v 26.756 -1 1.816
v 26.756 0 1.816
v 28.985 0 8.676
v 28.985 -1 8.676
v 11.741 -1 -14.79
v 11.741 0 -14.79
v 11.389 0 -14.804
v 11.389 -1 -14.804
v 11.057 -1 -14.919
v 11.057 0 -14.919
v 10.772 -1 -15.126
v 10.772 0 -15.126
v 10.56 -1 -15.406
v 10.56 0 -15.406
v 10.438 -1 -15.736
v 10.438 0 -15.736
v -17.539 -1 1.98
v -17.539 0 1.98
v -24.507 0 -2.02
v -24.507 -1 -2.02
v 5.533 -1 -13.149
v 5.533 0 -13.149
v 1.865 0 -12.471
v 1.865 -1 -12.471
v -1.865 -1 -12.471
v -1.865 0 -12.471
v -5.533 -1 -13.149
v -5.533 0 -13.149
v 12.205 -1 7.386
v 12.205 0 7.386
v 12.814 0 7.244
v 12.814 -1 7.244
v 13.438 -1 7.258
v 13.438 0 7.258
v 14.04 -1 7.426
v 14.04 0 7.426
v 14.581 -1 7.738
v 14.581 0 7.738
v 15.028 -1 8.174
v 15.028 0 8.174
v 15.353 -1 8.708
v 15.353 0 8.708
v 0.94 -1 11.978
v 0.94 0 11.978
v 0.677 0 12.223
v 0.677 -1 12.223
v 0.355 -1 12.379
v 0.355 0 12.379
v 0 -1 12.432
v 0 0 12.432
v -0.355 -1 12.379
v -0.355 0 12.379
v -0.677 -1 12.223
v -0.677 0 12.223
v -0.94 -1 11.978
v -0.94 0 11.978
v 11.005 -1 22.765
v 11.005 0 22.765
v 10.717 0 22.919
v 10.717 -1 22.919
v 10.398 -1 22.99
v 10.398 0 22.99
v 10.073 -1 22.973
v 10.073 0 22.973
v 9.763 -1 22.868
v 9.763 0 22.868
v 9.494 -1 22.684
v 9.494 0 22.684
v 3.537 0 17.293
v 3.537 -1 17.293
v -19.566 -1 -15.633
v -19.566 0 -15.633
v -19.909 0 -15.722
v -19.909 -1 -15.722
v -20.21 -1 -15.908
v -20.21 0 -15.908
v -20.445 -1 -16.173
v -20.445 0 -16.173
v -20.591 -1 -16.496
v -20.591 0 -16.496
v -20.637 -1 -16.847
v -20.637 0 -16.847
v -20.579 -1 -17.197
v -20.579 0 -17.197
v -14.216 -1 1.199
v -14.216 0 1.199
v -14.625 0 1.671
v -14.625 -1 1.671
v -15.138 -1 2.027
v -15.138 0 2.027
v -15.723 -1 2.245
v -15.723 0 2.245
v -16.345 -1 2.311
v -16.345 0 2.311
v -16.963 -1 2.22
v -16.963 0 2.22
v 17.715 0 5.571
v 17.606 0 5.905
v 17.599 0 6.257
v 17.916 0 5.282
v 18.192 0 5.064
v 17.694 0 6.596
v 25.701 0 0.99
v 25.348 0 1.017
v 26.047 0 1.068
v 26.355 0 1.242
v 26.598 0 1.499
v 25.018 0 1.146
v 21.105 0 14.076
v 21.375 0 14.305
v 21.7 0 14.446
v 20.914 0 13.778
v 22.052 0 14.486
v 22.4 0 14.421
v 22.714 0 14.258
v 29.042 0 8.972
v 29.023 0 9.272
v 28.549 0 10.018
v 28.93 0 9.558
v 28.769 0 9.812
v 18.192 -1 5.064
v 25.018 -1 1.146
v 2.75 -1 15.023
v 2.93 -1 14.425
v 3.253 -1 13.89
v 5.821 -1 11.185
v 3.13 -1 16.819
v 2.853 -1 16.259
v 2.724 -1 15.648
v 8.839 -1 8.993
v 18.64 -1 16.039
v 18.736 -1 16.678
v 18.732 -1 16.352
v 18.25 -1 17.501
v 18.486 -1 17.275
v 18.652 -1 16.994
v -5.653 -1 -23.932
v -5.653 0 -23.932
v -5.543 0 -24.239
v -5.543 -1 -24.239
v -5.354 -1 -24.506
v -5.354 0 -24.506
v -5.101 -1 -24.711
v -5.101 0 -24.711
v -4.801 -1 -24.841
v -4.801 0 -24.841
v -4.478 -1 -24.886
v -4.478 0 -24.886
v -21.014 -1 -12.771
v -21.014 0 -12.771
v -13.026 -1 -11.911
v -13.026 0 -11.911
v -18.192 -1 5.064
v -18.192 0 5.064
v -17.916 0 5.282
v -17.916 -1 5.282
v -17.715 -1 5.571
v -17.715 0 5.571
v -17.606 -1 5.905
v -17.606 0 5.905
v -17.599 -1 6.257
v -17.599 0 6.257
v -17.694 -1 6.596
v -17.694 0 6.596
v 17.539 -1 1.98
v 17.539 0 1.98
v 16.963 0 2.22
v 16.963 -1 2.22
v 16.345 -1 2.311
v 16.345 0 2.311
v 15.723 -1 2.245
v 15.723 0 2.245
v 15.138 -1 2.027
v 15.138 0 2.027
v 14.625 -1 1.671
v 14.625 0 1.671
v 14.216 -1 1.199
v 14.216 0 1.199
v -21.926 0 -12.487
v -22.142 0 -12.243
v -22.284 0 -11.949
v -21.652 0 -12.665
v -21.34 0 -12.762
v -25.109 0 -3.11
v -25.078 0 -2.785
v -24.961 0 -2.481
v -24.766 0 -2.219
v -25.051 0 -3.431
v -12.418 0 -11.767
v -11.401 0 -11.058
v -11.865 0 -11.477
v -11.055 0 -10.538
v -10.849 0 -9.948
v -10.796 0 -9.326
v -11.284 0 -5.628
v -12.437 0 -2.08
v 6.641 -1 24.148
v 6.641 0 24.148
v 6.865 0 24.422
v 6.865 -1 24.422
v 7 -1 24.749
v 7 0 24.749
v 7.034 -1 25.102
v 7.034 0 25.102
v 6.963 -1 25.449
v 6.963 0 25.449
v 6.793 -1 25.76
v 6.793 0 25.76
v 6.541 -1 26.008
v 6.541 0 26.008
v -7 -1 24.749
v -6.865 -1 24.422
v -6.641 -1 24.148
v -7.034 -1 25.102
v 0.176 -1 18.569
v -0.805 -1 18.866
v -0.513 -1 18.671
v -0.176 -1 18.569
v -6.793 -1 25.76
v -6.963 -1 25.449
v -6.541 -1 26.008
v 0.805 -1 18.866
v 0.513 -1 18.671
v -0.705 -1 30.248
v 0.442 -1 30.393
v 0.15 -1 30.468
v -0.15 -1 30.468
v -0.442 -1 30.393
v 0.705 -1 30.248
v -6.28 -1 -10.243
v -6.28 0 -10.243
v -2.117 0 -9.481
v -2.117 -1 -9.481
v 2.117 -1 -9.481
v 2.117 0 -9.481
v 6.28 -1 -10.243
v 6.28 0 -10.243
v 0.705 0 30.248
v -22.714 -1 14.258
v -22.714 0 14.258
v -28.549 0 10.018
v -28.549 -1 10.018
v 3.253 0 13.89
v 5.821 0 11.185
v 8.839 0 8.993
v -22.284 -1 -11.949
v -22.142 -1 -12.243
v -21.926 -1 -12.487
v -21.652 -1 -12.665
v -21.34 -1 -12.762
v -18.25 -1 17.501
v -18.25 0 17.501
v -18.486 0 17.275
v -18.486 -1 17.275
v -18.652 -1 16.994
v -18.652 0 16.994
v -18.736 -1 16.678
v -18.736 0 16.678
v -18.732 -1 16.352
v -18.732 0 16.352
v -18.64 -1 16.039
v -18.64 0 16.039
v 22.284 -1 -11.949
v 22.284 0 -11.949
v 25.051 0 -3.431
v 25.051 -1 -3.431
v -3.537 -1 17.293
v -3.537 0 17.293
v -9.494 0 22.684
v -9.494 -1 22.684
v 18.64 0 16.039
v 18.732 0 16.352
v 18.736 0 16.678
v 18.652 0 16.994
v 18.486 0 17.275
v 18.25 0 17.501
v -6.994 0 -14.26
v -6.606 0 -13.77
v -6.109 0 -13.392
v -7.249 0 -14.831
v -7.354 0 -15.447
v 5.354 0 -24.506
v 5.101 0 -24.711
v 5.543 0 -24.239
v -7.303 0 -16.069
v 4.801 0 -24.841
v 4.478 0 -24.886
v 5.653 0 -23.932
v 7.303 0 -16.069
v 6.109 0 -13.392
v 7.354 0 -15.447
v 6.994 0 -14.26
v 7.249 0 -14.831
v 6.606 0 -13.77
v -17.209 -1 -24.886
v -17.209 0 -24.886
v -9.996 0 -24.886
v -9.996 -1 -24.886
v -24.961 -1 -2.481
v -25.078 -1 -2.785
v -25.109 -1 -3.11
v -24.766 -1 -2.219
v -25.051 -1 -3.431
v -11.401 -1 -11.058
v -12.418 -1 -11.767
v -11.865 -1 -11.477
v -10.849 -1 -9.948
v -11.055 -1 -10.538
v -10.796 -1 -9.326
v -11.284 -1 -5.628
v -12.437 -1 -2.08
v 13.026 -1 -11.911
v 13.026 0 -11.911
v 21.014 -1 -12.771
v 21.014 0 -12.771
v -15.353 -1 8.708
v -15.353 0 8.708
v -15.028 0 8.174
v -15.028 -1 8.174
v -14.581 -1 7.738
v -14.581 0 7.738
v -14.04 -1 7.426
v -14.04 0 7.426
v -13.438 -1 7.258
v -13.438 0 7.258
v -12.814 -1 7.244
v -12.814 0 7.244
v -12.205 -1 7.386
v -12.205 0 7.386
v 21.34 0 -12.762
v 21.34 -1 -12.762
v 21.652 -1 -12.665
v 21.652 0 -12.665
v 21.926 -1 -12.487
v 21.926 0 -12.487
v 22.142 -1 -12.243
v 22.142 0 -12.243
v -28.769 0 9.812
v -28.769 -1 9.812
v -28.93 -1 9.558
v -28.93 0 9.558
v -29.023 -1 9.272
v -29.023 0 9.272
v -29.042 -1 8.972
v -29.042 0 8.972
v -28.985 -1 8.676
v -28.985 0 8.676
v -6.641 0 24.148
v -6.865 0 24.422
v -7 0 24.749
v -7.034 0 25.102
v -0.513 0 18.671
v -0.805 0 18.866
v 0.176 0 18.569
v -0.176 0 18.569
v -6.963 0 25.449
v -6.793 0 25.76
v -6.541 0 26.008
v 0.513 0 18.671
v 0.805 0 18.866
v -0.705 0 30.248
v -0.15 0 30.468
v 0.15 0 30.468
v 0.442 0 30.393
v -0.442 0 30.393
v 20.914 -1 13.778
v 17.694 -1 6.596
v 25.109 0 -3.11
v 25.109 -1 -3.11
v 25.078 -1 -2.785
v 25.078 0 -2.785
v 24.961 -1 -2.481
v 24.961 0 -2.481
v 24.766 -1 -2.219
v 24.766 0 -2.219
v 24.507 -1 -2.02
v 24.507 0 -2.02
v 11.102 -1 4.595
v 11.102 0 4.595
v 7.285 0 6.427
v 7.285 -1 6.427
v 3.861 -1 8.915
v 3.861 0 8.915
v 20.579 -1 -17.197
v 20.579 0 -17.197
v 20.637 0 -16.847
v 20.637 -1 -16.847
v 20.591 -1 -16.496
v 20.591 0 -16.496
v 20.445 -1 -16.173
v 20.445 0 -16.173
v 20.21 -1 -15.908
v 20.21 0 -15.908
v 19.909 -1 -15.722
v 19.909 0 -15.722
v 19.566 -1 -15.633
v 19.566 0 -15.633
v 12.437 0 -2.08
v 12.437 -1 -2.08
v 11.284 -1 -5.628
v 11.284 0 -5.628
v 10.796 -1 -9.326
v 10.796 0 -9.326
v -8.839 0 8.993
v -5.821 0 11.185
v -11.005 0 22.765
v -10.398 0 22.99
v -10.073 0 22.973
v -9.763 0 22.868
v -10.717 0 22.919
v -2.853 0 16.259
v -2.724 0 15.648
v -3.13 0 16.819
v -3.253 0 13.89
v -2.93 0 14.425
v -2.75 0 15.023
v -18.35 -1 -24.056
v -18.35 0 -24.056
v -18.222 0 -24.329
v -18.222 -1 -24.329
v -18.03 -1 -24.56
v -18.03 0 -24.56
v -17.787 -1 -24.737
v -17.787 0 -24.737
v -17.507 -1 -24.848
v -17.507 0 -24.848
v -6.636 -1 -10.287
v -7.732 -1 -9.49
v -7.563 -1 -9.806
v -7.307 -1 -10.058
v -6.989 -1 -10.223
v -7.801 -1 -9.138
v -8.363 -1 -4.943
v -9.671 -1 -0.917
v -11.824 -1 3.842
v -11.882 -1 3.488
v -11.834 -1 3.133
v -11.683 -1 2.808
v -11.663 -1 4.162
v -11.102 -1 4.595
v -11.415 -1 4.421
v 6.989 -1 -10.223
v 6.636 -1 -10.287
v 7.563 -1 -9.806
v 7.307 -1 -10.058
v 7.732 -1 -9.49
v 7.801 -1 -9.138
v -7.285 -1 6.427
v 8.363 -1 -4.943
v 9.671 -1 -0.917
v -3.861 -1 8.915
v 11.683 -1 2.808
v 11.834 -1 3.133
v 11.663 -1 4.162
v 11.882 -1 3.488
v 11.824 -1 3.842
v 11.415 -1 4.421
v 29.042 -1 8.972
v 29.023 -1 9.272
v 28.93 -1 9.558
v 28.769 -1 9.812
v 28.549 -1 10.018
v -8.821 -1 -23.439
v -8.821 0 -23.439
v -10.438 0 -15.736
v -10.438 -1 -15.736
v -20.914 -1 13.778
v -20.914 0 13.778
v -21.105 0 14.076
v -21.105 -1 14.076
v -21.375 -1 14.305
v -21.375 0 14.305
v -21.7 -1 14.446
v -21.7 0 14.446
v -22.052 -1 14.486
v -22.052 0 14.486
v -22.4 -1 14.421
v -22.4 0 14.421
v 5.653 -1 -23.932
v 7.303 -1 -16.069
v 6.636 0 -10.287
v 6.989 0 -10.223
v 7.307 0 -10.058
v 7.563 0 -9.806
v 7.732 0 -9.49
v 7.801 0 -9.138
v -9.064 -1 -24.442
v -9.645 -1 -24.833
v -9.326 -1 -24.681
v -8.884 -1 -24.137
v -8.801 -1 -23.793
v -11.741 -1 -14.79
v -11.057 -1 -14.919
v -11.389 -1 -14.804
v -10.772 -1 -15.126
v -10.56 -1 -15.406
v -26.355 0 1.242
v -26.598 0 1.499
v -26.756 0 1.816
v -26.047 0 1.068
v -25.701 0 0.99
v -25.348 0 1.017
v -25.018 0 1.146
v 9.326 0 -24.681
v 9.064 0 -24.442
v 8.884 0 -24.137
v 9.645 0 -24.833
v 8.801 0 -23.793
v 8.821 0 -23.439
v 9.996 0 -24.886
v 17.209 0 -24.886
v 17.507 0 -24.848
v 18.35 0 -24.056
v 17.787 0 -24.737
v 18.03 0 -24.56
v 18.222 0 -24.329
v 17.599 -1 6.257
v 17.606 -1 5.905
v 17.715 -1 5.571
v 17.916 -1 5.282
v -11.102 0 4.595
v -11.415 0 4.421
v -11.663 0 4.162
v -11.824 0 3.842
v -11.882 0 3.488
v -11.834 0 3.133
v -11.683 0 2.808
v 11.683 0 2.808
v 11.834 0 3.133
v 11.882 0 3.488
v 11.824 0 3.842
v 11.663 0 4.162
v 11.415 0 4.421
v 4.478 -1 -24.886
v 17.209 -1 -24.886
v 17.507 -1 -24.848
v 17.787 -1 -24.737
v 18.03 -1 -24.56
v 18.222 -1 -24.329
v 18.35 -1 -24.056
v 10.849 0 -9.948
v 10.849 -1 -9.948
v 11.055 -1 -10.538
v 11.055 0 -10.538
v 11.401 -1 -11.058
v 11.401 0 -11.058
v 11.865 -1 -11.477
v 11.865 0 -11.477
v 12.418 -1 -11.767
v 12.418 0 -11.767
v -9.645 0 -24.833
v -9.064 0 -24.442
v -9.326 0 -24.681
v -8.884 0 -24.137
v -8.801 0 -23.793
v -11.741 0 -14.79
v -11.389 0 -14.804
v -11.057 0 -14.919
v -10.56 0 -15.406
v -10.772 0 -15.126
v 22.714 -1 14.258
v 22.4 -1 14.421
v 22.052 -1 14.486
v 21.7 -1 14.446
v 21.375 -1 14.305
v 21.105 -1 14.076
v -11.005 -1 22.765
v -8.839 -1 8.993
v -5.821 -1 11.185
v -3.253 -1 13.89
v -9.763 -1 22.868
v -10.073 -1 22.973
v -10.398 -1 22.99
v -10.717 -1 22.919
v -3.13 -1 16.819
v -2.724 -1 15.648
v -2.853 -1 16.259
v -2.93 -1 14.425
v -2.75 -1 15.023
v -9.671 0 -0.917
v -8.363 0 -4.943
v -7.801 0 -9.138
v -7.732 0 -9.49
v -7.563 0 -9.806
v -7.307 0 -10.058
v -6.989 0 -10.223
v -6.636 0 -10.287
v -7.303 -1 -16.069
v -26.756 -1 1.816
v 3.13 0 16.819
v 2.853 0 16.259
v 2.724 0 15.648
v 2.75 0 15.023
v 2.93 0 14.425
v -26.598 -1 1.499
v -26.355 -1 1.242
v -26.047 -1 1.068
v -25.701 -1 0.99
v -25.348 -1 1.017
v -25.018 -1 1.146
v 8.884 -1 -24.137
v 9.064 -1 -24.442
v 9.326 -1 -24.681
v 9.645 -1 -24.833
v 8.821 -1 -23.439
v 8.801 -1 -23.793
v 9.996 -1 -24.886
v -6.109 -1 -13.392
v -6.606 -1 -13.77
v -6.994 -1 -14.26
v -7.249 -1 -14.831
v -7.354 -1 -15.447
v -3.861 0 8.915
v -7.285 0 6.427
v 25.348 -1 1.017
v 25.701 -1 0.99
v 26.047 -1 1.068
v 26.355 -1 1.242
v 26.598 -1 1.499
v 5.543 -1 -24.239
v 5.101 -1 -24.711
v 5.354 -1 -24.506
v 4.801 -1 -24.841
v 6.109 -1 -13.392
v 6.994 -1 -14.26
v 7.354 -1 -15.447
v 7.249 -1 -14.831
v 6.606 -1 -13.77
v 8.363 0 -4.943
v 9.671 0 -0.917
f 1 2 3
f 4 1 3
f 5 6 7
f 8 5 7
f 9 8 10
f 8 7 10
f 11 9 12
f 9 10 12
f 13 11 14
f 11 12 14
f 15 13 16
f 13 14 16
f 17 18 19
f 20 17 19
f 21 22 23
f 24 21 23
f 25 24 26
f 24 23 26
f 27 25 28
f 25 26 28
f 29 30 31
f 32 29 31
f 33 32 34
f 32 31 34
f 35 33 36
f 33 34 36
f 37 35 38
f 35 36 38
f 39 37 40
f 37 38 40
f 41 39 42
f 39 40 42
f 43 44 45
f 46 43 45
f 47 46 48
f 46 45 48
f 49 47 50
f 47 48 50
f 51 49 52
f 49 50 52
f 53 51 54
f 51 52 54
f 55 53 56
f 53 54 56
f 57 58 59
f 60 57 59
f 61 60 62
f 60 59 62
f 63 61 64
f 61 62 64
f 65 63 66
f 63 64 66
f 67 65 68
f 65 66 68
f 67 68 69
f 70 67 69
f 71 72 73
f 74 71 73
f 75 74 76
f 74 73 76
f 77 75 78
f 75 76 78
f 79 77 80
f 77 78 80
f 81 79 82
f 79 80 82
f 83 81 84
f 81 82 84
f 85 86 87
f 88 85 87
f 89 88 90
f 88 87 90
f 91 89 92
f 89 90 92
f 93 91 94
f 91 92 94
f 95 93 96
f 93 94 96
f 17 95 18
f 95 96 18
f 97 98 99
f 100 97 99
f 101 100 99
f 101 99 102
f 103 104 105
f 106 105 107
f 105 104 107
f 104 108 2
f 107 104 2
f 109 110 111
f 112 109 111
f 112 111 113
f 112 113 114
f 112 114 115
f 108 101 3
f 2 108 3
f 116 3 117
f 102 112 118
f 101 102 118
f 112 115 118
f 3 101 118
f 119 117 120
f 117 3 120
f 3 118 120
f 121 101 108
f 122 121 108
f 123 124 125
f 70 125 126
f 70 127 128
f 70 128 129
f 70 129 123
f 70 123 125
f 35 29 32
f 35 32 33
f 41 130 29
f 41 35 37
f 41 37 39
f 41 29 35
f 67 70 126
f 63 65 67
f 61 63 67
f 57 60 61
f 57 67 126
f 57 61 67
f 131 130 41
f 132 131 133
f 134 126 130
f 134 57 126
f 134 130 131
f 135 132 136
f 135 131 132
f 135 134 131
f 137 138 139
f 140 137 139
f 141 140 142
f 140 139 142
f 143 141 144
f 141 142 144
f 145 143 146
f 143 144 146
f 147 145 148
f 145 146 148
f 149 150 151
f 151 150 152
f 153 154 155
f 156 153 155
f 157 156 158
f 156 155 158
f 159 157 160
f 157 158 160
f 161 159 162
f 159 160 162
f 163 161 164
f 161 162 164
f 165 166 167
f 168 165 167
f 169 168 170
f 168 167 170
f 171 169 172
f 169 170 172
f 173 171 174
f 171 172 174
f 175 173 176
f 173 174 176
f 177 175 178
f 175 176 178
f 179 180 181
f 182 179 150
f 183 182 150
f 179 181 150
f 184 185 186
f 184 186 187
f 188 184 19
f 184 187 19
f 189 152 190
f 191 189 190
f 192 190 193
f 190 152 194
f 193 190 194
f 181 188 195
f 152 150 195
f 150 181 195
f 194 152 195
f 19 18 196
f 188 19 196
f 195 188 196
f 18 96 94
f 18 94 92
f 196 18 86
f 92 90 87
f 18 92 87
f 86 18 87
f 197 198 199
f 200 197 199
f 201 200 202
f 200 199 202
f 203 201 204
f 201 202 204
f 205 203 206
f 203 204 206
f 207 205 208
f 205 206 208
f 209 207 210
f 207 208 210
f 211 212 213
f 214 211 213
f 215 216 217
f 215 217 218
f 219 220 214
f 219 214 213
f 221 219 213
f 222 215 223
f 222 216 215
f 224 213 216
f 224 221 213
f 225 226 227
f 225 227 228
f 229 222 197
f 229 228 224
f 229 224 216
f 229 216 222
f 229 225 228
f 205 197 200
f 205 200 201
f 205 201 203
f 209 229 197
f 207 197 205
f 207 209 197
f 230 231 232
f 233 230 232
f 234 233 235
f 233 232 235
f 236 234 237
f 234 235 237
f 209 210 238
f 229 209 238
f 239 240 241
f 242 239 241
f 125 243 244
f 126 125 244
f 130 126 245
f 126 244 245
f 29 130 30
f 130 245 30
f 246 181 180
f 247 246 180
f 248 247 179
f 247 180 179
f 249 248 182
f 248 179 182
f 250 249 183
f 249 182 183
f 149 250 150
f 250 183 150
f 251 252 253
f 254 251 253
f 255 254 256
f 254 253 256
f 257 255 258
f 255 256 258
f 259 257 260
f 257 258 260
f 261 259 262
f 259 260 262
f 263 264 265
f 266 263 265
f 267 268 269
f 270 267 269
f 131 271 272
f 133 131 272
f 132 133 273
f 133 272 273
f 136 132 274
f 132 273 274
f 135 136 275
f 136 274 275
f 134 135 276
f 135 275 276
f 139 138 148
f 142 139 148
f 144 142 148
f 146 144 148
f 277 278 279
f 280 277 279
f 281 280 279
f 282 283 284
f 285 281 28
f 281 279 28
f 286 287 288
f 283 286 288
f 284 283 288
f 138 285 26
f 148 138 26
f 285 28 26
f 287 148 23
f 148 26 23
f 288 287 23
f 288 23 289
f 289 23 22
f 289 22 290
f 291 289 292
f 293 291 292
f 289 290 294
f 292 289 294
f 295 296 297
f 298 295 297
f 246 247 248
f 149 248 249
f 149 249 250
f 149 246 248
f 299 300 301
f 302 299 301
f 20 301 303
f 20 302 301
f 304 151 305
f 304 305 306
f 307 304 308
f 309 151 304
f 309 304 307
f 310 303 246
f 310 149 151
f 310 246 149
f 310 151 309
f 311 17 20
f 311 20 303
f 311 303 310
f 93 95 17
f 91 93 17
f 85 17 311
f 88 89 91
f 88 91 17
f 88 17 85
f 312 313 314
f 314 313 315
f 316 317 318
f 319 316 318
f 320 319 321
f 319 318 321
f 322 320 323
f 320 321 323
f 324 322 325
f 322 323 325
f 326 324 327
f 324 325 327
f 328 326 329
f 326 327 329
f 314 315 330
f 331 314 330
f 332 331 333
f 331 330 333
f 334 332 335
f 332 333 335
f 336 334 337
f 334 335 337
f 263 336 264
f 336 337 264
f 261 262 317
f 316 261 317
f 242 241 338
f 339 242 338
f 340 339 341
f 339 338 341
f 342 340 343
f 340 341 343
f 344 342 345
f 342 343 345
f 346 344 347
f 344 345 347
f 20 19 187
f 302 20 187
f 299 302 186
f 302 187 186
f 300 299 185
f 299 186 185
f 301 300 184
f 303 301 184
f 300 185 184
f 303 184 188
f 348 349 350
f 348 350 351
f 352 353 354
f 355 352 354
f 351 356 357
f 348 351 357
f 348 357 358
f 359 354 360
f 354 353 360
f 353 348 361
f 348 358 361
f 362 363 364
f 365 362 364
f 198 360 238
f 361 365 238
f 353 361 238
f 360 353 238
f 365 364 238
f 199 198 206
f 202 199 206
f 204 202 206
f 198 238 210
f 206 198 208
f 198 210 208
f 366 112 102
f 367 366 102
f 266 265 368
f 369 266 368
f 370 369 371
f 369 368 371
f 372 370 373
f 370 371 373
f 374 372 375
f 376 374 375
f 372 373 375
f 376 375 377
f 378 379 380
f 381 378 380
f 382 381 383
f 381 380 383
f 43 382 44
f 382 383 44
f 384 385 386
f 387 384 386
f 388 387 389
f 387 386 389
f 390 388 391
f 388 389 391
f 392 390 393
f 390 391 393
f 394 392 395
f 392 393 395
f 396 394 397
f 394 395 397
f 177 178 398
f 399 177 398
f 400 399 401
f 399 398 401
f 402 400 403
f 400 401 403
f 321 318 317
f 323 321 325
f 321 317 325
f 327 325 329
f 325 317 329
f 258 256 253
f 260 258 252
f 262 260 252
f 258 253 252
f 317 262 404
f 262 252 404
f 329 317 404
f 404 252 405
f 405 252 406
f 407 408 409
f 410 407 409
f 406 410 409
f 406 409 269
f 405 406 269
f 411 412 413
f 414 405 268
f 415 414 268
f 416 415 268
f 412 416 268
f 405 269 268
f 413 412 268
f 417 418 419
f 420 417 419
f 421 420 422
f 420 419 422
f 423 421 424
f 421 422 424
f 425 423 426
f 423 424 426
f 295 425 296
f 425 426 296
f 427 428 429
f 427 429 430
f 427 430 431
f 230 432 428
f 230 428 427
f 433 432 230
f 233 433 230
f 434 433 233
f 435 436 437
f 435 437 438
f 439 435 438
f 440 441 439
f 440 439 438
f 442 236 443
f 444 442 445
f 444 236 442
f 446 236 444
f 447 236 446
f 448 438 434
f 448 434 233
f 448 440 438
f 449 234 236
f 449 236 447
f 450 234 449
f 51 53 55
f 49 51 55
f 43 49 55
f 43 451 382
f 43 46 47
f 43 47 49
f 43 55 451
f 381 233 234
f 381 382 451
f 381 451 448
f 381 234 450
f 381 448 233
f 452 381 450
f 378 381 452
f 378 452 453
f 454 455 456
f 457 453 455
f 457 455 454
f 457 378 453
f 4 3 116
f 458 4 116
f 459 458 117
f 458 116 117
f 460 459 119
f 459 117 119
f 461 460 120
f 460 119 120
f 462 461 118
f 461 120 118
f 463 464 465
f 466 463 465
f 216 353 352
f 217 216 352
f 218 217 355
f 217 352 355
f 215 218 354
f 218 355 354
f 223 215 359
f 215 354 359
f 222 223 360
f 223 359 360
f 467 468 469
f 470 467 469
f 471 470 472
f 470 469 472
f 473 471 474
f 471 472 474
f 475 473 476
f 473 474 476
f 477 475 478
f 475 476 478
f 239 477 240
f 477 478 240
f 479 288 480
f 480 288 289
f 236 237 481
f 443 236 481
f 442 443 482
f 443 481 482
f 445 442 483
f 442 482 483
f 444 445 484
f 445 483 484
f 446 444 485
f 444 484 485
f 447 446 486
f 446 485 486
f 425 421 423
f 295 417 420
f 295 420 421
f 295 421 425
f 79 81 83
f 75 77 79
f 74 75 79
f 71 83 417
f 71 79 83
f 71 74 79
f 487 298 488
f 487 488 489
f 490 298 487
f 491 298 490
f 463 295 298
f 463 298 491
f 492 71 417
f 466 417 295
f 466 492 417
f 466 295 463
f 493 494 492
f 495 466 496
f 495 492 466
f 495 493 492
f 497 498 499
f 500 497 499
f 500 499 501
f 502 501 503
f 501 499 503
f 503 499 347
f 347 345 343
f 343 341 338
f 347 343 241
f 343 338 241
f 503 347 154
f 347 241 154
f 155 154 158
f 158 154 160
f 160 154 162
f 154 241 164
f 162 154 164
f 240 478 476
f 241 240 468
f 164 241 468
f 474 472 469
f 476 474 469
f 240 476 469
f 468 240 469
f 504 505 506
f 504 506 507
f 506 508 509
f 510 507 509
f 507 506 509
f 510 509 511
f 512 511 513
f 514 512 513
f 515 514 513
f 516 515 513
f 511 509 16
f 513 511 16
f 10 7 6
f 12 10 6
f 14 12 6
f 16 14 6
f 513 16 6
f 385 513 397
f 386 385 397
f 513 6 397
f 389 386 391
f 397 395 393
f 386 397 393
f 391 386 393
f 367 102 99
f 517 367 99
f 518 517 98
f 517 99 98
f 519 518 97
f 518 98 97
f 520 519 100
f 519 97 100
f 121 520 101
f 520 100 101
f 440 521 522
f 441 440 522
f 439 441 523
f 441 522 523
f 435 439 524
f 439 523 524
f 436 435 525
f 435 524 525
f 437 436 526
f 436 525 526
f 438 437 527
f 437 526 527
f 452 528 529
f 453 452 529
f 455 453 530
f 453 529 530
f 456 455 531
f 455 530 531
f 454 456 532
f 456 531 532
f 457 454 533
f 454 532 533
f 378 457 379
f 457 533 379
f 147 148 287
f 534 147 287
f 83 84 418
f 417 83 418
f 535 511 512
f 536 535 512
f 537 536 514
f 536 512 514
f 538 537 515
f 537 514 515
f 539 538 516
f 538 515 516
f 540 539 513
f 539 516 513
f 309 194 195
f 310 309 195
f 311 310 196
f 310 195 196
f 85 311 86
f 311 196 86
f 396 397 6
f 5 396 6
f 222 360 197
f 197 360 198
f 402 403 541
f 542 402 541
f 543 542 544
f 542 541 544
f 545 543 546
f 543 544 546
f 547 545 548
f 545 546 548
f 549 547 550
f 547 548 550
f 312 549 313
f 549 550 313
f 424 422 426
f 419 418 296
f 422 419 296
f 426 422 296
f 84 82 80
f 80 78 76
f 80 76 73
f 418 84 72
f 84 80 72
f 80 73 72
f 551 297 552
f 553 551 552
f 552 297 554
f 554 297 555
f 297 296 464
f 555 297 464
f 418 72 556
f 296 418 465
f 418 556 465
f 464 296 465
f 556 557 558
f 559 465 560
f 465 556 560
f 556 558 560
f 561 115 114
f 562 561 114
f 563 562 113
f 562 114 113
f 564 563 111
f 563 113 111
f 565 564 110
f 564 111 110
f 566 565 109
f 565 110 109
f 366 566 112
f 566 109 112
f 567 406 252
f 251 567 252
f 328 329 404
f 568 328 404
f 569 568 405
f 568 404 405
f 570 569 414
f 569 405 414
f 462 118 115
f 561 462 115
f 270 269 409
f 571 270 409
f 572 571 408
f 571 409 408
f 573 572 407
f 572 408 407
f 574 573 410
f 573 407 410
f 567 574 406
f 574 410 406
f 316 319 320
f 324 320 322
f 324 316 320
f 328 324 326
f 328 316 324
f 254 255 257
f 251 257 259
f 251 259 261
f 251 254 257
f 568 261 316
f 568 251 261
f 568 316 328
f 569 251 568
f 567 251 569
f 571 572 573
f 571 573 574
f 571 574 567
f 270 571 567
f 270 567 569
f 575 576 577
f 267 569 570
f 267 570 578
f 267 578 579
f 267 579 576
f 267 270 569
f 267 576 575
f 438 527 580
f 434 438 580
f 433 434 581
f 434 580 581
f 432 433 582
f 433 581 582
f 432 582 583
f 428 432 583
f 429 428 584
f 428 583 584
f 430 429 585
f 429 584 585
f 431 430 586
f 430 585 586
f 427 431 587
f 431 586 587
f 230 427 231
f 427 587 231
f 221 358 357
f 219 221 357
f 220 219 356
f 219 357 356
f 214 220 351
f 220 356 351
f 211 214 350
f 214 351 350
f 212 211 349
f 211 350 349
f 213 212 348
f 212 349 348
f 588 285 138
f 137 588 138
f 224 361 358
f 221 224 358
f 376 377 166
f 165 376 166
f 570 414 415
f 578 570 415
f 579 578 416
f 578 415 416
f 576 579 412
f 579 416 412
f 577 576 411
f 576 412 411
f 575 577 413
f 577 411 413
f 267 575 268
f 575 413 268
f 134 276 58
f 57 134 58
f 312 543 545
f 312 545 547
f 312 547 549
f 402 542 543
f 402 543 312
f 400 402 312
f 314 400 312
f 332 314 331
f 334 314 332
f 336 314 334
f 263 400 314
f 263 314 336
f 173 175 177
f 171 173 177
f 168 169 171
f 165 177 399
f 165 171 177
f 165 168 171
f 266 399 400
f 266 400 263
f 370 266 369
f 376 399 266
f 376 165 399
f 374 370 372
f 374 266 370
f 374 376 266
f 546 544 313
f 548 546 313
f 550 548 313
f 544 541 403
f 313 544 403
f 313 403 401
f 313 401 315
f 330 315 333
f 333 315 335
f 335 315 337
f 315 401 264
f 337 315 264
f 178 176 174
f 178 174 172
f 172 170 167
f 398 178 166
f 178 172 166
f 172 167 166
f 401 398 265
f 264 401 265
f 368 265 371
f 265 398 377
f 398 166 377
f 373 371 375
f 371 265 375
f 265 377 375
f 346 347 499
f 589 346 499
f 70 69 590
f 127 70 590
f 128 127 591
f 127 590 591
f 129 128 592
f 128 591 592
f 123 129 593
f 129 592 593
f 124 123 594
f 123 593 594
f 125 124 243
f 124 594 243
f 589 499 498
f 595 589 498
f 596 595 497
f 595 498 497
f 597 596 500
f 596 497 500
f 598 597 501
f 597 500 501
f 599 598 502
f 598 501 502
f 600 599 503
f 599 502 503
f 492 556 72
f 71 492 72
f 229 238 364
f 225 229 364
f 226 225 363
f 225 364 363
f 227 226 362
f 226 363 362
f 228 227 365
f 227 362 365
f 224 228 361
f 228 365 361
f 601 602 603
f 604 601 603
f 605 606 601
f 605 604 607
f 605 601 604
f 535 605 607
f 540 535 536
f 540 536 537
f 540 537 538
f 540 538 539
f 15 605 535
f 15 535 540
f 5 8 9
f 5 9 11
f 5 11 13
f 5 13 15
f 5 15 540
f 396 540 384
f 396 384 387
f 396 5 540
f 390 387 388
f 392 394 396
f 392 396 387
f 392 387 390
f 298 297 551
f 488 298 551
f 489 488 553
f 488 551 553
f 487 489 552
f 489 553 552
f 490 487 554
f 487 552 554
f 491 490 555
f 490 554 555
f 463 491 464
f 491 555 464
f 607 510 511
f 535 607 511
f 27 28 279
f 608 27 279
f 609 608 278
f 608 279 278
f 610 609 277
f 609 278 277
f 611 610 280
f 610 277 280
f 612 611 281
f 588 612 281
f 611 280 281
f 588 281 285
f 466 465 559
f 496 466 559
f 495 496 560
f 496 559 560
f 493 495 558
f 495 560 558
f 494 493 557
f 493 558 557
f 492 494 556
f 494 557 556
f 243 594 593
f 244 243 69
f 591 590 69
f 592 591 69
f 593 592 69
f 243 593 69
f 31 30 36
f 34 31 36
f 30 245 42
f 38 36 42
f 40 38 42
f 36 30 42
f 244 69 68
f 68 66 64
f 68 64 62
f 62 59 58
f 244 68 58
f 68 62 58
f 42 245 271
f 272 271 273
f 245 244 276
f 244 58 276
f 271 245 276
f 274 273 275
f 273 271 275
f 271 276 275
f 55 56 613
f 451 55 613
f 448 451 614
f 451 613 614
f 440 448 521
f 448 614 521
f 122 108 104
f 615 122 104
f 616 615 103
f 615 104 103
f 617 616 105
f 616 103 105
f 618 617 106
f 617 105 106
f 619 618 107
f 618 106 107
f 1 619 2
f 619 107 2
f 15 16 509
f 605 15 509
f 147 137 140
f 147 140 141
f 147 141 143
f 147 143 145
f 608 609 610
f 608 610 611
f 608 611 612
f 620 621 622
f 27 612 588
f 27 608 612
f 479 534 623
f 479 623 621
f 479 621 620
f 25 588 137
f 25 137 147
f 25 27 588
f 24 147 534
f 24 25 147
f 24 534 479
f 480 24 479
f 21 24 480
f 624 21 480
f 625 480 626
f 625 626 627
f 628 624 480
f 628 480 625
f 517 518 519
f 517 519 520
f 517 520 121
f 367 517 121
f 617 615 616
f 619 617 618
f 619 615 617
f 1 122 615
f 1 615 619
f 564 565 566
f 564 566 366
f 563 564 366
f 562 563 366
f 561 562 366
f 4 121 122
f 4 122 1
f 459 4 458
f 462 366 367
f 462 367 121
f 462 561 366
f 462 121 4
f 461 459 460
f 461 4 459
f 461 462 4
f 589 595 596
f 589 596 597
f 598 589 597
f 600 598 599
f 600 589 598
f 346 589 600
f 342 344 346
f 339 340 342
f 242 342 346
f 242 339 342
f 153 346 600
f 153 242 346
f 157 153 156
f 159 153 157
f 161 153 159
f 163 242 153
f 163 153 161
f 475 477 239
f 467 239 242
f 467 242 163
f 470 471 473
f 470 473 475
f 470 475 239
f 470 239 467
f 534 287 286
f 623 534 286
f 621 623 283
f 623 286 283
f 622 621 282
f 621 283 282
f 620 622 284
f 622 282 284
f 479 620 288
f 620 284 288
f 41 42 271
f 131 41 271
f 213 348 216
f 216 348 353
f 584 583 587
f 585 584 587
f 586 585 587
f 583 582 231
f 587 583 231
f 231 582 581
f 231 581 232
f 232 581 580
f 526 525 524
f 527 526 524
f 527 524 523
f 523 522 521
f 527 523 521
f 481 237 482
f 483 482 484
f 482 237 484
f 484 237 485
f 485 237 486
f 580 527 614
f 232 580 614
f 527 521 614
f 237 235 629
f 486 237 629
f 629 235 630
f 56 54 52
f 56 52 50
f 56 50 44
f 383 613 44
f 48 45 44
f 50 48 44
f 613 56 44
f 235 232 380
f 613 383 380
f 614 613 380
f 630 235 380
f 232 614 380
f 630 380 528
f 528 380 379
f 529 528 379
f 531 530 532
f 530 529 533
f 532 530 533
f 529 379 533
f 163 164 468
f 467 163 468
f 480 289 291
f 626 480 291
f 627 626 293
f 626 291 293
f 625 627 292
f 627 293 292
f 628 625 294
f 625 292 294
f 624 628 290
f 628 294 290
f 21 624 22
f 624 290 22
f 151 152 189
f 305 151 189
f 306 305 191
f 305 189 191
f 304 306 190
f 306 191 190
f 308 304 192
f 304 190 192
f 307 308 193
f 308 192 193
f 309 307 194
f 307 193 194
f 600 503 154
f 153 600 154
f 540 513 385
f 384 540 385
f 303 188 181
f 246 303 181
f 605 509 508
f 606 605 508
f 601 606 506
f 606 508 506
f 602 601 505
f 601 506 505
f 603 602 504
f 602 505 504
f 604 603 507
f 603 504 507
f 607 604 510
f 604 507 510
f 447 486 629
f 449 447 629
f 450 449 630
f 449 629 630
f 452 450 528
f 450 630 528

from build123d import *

# Parameters (mm, degrees)
F1_DEPTH = 1


# Not quite as in the source:
# - a feature names something its author has since deleted; it is built from what else it names


with BuildPart() as f1:
    # F0 (on Front) → F1 (new body)
    with BuildSketch(Plane.XZ):
        with BuildLine():
            Line((-17.694116513, 6.5958520163), (-20.9137744033, 13.7776049975))
            ThreePointArc((-20.9137744033, 13.7776049975), (-21.6996777578, 14.4462150283), (-22.7141135884, 14.2575263913))
            Line((-22.7141135884, 14.2575263913), (-28.5494375554, 10.0179153646))
            ThreePointArc((-28.5494375554, 10.0179153646), (-28.9853630722, 9.4179153646), (-28.9853630722, 8.6762745781))
            Line((-28.9853630722, 8.6762745781), (-26.7564676522, 1.8164398378))
            ThreePointArc((-26.7564676522, 1.8164398378), (-26.0466802236, 1.0675171033), (-25.0178719382, 1.1464915793))
            Line((-25.0178719382, 1.1464915793), (-18.191785501, 5.0641843652))
            ThreePointArc((-18.191785501, 5.0641843652), (-17.6478455759, 5.7341326237), (-17.694116513, 6.5958520163))
        make_face()
    extrude(amount=F1_DEPTH)


with BuildPart() as f1b:
    # F0 (on Front) → F1, piece 2 (new body)
    with BuildSketch(Plane.XZ):
        with BuildLine():
            ThreePointArc((-12.2053541777, 7.3856519674), (-7.2800742754, 10.0201626124), (-3.2525105674, 13.8902735969))
            ThreePointArc((-3.2525105674, 13.8902735969), (-2.7235874919, 15.6476925752), (-3.5372825515, 17.2927401232))
            Line((-3.5372825515, 17.2927401232), (-9.4939464638, 22.6839212654))
            ThreePointArc((-9.4939464638, 22.6839212654), (-10.2348492198, 22.9924872502), (-11.0045341042, 22.7650338717))
            Line((-11.0045341042, 22.7650338717), (-18.2502457539, 17.5007162125))
            ThreePointArc((-18.2502457539, 17.5007162125), (-18.7044124814, 16.838989347), (-18.6399003336, 16.0389968198))
            Line((-18.6399003336, 16.0389968198), (-15.3532927565, 8.7079061979))
            ThreePointArc((-15.3532927565, 8.7079061979), (-14.040205168, 7.4256885604), (-12.2053541777, 7.3856519674))
        make_face()
    extrude(amount=F1_DEPTH)


with BuildPart() as f1c:
    # F0 (on Front) → F1, piece 3 (new body)
    with BuildSketch(Plane.XZ):
        with BuildLine():
            Line((0.8052453376, 18.8663351752), (6.6405693046, 24.1476955125))
            ThreePointArc((6.6405693046, 24.1476955125), (7.0335977388, 25.1017458812), (6.5406662698, 26.0082236928))
            Line((6.5406662698, 26.0082236928), (0.7053423028, 30.2478347195))
            ThreePointArc((0.7053423028, 30.2478347195), (0, 30.4770143263), (-0.7053423028, 30.2478347195))
            Line((-0.7053423028, 30.2478347195), (-6.5406662698, 26.0082236928))
            ThreePointArc((-6.5406662698, 26.0082236928), (-7.0335977388, 25.1017458812), (-6.6405693046, 24.1476955125))
            Line((-6.6405693046, 24.1476955125), (-0.8052453376, 18.8663351752))
            ThreePointArc((-0.8052453376, 18.8663351752), (0, 18.5560429622), (0.8052453376, 18.8663351752))
        make_face()
    extrude(amount=F1_DEPTH)


with BuildPart() as f1d:
    # F0 (on Front) → F1, piece 4 (new body)
    with BuildSketch(Plane.XZ):
        with BuildLine():
            ThreePointArc((3.2525105674, 13.8902735969), (7.2800742754, 10.0201626124), (12.2053541777, 7.3856519674))
            ThreePointArc((12.2053541777, 7.3856519674), (14.040205168, 7.4256885604), (15.3532927565, 8.7079061979))
            Line((15.3532927565, 8.7079061979), (18.6399003336, 16.0389968198))
            ThreePointArc((18.6399003336, 16.0389968198), (18.7044124814, 16.838989347), (18.2502457539, 17.5007162125))
            Line((18.2502457539, 17.5007162125), (11.0045341042, 22.7650338717))
            ThreePointArc((11.0045341042, 22.7650338717), (10.2348492198, 22.9924872502), (9.4939464638, 22.6839212654))
            Line((9.4939464638, 22.6839212654), (3.5372825515, 17.2927401232))
            ThreePointArc((3.5372825515, 17.2927401232), (2.7235874919, 15.6476925752), (3.2525105674, 13.8902735969))
        make_face()
    extrude(amount=F1_DEPTH)


with BuildPart() as f1e:
    # F0 (on Front) → F1, piece 5 (new body)
    with BuildSketch(Plane.XZ):
        with BuildLine():
            ThreePointArc((-10.795834294, -9.3256896519), (-11.7794076183, -3.8273615451), (-14.2155162571, 1.1990092285))
            ThreePointArc((-14.2155162571, 1.1990092285), (-15.7234748093, 2.2451172966), (-17.5394536011, 1.9795949568))
            Line((-17.5394536011, 1.9795949568), (-24.5074819356, -2.0195624797))
            ThreePointArc((-24.5074819356, -2.0195624797), (-25.0298971689, -2.6288507405), (-25.0514218607, -3.4311515247))
            Line((-25.0514218607, -3.4311515247), (-22.2838062832, -11.9489964249))
            ThreePointArc((-22.2838062832, -11.9489964249), (-21.7948118729, -12.5854194976), (-21.0140384169, -12.7712760853))
            Line((-21.0140384169, -12.7712760853), (-13.0261393142, -11.9109581221))
            ThreePointArc((-13.0261393142, -11.9109581221), (-11.4009114947, -11.058364655), (-10.795834294, -9.3256896519))
        make_face()
    extrude(amount=F1_DEPTH)


with BuildPart() as f1f:
    # F0 (on Front) → F1, piece 6 (new body)
    with BuildSketch(Plane.XZ):
        with BuildLine():
            Line((-11.7408107436, -14.7898744444), (-19.5659927189, -15.6326673405))
            ThreePointArc((-19.5659927189, -15.6326673405), (-20.4447361381, -16.173493985), (-20.5787604917, -17.1965877874))
            Line((-20.5787604917, -17.1965877874), (-18.3498650717, -24.0564225277))
            ThreePointArc((-18.3498650717, -24.0564225277), (-17.9139395549, -24.6564225277), (-17.2085972521, -24.8856021345))
            Line((-17.2085972521, -24.8856021345), (-9.9957401582, -24.8856021345))
            ThreePointArc((-9.9957401582, -24.8856021345), (-9.0641359335, -24.4419840278), (-8.8213258793, -23.4391247487))
            Line((-8.8213258793, -23.4391247487), (-10.437896418, -15.7364971123))
            ThreePointArc((-10.437896418, -15.7364971123), (-10.9069683941, -15.0121541048), (-11.7408107436, -14.7898744444))
        make_face()
    extrude(amount=F1_DEPTH)


with BuildPart() as f1g:
    # F0 (on Front) → F1, piece 7 (new body)
    with BuildSketch(Plane.XZ):
        with BuildLine():
            ThreePointArc((-5.5331616471, -13.1492451408), (-6.9940543615, -14.2601337772), (-7.3026959181, -16.069283156))
            Line((-7.3026959181, -16.069283156), (-5.652510351, -23.9320795203))
            ThreePointArc((-5.652510351, -23.9320795203), (-5.2344779655, -24.6172063592), (-4.4780960722, -24.8856021345))
            Line((-4.4780960722, -24.8856021345), (4.4780960722, -24.8856021345))
            ThreePointArc((4.4780960722, -24.8856021345), (5.2344779655, -24.6172063592), (5.652510351, -23.9320795203))
            Line((5.652510351, -23.9320795203), (7.3026959181, -16.069283156))
            ThreePointArc((7.3026959181, -16.069283156), (6.9940543615, -14.2601337772), (5.5331616471, -13.1492451408))
            ThreePointArc((5.5331616471, -13.1492451408), (0, -12.3856021345), (-5.5331616471, -13.1492451408))
        make_face()
    extrude(amount=F1_DEPTH)


with BuildPart() as f1h:
    # F0 (on Front) → F1, piece 8 (new body)
    with BuildSketch(Plane.XZ):
        with BuildLine():
            Line((10.437896418, -15.7364971123), (8.8213258793, -23.4391247487))
            ThreePointArc((8.8213258793, -23.4391247487), (9.0641359335, -24.4419840278), (9.9957401582, -24.8856021345))
            Line((9.9957401582, -24.8856021345), (17.2085972521, -24.8856021345))
            ThreePointArc((17.2085972521, -24.8856021345), (17.9139395549, -24.6564225277), (18.3498650717, -24.0564225277))
            Line((18.3498650717, -24.0564225277), (20.5787604917, -17.1965877874))
            ThreePointArc((20.5787604917, -17.1965877874), (20.4447361381, -16.173493985), (19.5659927189, -15.6326673405))
            Line((19.5659927189, -15.6326673405), (11.7408107436, -14.7898744444))
            ThreePointArc((11.7408107436, -14.7898744444), (10.9069683941, -15.0121541048), (10.437896418, -15.7364971123))
        make_face()
    extrude(amount=F1_DEPTH)


with BuildPart() as f1i:
    # F0 (on Front) → F1, piece 9 (new body)
    with BuildSketch(Plane.XZ):
        with BuildLine():
            ThreePointArc((14.2155162571, 1.1990092285), (11.7794076183, -3.8273615451), (10.795834294, -9.3256896519))
            ThreePointArc((10.795834294, -9.3256896519), (11.4009114947, -11.058364655), (13.0261393142, -11.9109581221))
            Line((13.0261393142, -11.9109581221), (21.0140384169, -12.7712760853))
            ThreePointArc((21.0140384169, -12.7712760853), (21.7948118729, -12.5854194976), (22.2838062832, -11.9489964249))
            Line((22.2838062832, -11.9489964249), (25.0514218607, -3.4311515247))
            ThreePointArc((25.0514218607, -3.4311515247), (25.0298971689, -2.6288507405), (24.5074819356, -2.0195624797))
            Line((24.5074819356, -2.0195624797), (17.5394536011, 1.9795949568))
            ThreePointArc((17.5394536011, 1.9795949568), (15.7234748093, 2.2451172966), (14.2155162571, 1.1990092285))
        make_face()
    extrude(amount=F1_DEPTH)


with BuildPart() as f1j:
    # F0 (on Front) → F1, piece 10 (new body)
    with BuildSketch(Plane.XZ):
        with BuildLine():
            Line((18.191785501, 5.0641843652), (25.0178719382, 1.1464915793))
            ThreePointArc((25.0178719382, 1.1464915793), (26.0466802236, 1.0675171033), (26.7564676522, 1.8164398378))
            Line((26.7564676522, 1.8164398378), (28.9853630722, 8.6762745781))
            ThreePointArc((28.9853630722, 8.6762745781), (28.9853630722, 9.4179153646), (28.5494375554, 10.0179153646))
            Line((28.5494375554, 10.0179153646), (22.7141135884, 14.2575263913))
            ThreePointArc((22.7141135884, 14.2575263913), (21.6996777578, 14.4462150283), (20.9137744033, 13.7776049975))
            Line((20.9137744033, 13.7776049975), (17.694116513, 6.5958520163))
            ThreePointArc((17.694116513, 6.5958520163), (17.6478455759, 5.7341326237), (18.191785501, 5.0641843652))
        make_face()
    extrude(amount=F1_DEPTH)


with BuildPart() as f1k:
    # F0 (on Front) → F1, piece 11 (new body)
    with BuildSketch(Plane.XZ):
        with BuildLine():
            ThreePointArc((-6.2804257648, -10.2431120979), (0, -9.3856021345), (6.2804257648, -10.2431120979))
            ThreePointArc((6.2804257648, -10.2431120979), (7.3074595861, -10.0578552589), (7.8010202146, -9.1383355623))
            ThreePointArc((7.8010202146, -9.1383355623), (8.9262380694, -2.900310562), (11.6825368011, 2.8077441352))
            ThreePointArc((11.6825368011, 2.8077441352), (11.8237179817, 3.841758855), (11.1017214044, 4.5953101198))
            ThreePointArc((11.1017214044, 4.5953101198), (5.5167185185, 7.5931116293), (0.939779053, 11.9783934052))
            ThreePointArc((0.939779053, 11.9783934052), (0, 12.4321928078), (-0.939779053, 11.9783934052))
            ThreePointArc((-0.939779053, 11.9783934052), (-5.5167185185, 7.5931116293), (-11.1017214044, 4.5953101198))
            ThreePointArc((-11.1017214044, 4.5953101198), (-11.8237179817, 3.841758855), (-11.6825368011, 2.8077441352))
            ThreePointArc((-11.6825368011, 2.8077441352), (-8.9262380694, -2.900310562), (-7.8010202146, -9.1383355623))
            ThreePointArc((-7.8010202146, -9.1383355623), (-7.3074595861, -10.0578552589), (-6.2804257648, -10.2431120979))
        make_face()
    extrude(amount=F1_DEPTH)


solid = Compound([f1.part, f1b.part, f1c.part, f1d.part, f1e.part, f1f.part, f1g.part, f1h.part, f1i.part, f1j.part, f1k.part])
